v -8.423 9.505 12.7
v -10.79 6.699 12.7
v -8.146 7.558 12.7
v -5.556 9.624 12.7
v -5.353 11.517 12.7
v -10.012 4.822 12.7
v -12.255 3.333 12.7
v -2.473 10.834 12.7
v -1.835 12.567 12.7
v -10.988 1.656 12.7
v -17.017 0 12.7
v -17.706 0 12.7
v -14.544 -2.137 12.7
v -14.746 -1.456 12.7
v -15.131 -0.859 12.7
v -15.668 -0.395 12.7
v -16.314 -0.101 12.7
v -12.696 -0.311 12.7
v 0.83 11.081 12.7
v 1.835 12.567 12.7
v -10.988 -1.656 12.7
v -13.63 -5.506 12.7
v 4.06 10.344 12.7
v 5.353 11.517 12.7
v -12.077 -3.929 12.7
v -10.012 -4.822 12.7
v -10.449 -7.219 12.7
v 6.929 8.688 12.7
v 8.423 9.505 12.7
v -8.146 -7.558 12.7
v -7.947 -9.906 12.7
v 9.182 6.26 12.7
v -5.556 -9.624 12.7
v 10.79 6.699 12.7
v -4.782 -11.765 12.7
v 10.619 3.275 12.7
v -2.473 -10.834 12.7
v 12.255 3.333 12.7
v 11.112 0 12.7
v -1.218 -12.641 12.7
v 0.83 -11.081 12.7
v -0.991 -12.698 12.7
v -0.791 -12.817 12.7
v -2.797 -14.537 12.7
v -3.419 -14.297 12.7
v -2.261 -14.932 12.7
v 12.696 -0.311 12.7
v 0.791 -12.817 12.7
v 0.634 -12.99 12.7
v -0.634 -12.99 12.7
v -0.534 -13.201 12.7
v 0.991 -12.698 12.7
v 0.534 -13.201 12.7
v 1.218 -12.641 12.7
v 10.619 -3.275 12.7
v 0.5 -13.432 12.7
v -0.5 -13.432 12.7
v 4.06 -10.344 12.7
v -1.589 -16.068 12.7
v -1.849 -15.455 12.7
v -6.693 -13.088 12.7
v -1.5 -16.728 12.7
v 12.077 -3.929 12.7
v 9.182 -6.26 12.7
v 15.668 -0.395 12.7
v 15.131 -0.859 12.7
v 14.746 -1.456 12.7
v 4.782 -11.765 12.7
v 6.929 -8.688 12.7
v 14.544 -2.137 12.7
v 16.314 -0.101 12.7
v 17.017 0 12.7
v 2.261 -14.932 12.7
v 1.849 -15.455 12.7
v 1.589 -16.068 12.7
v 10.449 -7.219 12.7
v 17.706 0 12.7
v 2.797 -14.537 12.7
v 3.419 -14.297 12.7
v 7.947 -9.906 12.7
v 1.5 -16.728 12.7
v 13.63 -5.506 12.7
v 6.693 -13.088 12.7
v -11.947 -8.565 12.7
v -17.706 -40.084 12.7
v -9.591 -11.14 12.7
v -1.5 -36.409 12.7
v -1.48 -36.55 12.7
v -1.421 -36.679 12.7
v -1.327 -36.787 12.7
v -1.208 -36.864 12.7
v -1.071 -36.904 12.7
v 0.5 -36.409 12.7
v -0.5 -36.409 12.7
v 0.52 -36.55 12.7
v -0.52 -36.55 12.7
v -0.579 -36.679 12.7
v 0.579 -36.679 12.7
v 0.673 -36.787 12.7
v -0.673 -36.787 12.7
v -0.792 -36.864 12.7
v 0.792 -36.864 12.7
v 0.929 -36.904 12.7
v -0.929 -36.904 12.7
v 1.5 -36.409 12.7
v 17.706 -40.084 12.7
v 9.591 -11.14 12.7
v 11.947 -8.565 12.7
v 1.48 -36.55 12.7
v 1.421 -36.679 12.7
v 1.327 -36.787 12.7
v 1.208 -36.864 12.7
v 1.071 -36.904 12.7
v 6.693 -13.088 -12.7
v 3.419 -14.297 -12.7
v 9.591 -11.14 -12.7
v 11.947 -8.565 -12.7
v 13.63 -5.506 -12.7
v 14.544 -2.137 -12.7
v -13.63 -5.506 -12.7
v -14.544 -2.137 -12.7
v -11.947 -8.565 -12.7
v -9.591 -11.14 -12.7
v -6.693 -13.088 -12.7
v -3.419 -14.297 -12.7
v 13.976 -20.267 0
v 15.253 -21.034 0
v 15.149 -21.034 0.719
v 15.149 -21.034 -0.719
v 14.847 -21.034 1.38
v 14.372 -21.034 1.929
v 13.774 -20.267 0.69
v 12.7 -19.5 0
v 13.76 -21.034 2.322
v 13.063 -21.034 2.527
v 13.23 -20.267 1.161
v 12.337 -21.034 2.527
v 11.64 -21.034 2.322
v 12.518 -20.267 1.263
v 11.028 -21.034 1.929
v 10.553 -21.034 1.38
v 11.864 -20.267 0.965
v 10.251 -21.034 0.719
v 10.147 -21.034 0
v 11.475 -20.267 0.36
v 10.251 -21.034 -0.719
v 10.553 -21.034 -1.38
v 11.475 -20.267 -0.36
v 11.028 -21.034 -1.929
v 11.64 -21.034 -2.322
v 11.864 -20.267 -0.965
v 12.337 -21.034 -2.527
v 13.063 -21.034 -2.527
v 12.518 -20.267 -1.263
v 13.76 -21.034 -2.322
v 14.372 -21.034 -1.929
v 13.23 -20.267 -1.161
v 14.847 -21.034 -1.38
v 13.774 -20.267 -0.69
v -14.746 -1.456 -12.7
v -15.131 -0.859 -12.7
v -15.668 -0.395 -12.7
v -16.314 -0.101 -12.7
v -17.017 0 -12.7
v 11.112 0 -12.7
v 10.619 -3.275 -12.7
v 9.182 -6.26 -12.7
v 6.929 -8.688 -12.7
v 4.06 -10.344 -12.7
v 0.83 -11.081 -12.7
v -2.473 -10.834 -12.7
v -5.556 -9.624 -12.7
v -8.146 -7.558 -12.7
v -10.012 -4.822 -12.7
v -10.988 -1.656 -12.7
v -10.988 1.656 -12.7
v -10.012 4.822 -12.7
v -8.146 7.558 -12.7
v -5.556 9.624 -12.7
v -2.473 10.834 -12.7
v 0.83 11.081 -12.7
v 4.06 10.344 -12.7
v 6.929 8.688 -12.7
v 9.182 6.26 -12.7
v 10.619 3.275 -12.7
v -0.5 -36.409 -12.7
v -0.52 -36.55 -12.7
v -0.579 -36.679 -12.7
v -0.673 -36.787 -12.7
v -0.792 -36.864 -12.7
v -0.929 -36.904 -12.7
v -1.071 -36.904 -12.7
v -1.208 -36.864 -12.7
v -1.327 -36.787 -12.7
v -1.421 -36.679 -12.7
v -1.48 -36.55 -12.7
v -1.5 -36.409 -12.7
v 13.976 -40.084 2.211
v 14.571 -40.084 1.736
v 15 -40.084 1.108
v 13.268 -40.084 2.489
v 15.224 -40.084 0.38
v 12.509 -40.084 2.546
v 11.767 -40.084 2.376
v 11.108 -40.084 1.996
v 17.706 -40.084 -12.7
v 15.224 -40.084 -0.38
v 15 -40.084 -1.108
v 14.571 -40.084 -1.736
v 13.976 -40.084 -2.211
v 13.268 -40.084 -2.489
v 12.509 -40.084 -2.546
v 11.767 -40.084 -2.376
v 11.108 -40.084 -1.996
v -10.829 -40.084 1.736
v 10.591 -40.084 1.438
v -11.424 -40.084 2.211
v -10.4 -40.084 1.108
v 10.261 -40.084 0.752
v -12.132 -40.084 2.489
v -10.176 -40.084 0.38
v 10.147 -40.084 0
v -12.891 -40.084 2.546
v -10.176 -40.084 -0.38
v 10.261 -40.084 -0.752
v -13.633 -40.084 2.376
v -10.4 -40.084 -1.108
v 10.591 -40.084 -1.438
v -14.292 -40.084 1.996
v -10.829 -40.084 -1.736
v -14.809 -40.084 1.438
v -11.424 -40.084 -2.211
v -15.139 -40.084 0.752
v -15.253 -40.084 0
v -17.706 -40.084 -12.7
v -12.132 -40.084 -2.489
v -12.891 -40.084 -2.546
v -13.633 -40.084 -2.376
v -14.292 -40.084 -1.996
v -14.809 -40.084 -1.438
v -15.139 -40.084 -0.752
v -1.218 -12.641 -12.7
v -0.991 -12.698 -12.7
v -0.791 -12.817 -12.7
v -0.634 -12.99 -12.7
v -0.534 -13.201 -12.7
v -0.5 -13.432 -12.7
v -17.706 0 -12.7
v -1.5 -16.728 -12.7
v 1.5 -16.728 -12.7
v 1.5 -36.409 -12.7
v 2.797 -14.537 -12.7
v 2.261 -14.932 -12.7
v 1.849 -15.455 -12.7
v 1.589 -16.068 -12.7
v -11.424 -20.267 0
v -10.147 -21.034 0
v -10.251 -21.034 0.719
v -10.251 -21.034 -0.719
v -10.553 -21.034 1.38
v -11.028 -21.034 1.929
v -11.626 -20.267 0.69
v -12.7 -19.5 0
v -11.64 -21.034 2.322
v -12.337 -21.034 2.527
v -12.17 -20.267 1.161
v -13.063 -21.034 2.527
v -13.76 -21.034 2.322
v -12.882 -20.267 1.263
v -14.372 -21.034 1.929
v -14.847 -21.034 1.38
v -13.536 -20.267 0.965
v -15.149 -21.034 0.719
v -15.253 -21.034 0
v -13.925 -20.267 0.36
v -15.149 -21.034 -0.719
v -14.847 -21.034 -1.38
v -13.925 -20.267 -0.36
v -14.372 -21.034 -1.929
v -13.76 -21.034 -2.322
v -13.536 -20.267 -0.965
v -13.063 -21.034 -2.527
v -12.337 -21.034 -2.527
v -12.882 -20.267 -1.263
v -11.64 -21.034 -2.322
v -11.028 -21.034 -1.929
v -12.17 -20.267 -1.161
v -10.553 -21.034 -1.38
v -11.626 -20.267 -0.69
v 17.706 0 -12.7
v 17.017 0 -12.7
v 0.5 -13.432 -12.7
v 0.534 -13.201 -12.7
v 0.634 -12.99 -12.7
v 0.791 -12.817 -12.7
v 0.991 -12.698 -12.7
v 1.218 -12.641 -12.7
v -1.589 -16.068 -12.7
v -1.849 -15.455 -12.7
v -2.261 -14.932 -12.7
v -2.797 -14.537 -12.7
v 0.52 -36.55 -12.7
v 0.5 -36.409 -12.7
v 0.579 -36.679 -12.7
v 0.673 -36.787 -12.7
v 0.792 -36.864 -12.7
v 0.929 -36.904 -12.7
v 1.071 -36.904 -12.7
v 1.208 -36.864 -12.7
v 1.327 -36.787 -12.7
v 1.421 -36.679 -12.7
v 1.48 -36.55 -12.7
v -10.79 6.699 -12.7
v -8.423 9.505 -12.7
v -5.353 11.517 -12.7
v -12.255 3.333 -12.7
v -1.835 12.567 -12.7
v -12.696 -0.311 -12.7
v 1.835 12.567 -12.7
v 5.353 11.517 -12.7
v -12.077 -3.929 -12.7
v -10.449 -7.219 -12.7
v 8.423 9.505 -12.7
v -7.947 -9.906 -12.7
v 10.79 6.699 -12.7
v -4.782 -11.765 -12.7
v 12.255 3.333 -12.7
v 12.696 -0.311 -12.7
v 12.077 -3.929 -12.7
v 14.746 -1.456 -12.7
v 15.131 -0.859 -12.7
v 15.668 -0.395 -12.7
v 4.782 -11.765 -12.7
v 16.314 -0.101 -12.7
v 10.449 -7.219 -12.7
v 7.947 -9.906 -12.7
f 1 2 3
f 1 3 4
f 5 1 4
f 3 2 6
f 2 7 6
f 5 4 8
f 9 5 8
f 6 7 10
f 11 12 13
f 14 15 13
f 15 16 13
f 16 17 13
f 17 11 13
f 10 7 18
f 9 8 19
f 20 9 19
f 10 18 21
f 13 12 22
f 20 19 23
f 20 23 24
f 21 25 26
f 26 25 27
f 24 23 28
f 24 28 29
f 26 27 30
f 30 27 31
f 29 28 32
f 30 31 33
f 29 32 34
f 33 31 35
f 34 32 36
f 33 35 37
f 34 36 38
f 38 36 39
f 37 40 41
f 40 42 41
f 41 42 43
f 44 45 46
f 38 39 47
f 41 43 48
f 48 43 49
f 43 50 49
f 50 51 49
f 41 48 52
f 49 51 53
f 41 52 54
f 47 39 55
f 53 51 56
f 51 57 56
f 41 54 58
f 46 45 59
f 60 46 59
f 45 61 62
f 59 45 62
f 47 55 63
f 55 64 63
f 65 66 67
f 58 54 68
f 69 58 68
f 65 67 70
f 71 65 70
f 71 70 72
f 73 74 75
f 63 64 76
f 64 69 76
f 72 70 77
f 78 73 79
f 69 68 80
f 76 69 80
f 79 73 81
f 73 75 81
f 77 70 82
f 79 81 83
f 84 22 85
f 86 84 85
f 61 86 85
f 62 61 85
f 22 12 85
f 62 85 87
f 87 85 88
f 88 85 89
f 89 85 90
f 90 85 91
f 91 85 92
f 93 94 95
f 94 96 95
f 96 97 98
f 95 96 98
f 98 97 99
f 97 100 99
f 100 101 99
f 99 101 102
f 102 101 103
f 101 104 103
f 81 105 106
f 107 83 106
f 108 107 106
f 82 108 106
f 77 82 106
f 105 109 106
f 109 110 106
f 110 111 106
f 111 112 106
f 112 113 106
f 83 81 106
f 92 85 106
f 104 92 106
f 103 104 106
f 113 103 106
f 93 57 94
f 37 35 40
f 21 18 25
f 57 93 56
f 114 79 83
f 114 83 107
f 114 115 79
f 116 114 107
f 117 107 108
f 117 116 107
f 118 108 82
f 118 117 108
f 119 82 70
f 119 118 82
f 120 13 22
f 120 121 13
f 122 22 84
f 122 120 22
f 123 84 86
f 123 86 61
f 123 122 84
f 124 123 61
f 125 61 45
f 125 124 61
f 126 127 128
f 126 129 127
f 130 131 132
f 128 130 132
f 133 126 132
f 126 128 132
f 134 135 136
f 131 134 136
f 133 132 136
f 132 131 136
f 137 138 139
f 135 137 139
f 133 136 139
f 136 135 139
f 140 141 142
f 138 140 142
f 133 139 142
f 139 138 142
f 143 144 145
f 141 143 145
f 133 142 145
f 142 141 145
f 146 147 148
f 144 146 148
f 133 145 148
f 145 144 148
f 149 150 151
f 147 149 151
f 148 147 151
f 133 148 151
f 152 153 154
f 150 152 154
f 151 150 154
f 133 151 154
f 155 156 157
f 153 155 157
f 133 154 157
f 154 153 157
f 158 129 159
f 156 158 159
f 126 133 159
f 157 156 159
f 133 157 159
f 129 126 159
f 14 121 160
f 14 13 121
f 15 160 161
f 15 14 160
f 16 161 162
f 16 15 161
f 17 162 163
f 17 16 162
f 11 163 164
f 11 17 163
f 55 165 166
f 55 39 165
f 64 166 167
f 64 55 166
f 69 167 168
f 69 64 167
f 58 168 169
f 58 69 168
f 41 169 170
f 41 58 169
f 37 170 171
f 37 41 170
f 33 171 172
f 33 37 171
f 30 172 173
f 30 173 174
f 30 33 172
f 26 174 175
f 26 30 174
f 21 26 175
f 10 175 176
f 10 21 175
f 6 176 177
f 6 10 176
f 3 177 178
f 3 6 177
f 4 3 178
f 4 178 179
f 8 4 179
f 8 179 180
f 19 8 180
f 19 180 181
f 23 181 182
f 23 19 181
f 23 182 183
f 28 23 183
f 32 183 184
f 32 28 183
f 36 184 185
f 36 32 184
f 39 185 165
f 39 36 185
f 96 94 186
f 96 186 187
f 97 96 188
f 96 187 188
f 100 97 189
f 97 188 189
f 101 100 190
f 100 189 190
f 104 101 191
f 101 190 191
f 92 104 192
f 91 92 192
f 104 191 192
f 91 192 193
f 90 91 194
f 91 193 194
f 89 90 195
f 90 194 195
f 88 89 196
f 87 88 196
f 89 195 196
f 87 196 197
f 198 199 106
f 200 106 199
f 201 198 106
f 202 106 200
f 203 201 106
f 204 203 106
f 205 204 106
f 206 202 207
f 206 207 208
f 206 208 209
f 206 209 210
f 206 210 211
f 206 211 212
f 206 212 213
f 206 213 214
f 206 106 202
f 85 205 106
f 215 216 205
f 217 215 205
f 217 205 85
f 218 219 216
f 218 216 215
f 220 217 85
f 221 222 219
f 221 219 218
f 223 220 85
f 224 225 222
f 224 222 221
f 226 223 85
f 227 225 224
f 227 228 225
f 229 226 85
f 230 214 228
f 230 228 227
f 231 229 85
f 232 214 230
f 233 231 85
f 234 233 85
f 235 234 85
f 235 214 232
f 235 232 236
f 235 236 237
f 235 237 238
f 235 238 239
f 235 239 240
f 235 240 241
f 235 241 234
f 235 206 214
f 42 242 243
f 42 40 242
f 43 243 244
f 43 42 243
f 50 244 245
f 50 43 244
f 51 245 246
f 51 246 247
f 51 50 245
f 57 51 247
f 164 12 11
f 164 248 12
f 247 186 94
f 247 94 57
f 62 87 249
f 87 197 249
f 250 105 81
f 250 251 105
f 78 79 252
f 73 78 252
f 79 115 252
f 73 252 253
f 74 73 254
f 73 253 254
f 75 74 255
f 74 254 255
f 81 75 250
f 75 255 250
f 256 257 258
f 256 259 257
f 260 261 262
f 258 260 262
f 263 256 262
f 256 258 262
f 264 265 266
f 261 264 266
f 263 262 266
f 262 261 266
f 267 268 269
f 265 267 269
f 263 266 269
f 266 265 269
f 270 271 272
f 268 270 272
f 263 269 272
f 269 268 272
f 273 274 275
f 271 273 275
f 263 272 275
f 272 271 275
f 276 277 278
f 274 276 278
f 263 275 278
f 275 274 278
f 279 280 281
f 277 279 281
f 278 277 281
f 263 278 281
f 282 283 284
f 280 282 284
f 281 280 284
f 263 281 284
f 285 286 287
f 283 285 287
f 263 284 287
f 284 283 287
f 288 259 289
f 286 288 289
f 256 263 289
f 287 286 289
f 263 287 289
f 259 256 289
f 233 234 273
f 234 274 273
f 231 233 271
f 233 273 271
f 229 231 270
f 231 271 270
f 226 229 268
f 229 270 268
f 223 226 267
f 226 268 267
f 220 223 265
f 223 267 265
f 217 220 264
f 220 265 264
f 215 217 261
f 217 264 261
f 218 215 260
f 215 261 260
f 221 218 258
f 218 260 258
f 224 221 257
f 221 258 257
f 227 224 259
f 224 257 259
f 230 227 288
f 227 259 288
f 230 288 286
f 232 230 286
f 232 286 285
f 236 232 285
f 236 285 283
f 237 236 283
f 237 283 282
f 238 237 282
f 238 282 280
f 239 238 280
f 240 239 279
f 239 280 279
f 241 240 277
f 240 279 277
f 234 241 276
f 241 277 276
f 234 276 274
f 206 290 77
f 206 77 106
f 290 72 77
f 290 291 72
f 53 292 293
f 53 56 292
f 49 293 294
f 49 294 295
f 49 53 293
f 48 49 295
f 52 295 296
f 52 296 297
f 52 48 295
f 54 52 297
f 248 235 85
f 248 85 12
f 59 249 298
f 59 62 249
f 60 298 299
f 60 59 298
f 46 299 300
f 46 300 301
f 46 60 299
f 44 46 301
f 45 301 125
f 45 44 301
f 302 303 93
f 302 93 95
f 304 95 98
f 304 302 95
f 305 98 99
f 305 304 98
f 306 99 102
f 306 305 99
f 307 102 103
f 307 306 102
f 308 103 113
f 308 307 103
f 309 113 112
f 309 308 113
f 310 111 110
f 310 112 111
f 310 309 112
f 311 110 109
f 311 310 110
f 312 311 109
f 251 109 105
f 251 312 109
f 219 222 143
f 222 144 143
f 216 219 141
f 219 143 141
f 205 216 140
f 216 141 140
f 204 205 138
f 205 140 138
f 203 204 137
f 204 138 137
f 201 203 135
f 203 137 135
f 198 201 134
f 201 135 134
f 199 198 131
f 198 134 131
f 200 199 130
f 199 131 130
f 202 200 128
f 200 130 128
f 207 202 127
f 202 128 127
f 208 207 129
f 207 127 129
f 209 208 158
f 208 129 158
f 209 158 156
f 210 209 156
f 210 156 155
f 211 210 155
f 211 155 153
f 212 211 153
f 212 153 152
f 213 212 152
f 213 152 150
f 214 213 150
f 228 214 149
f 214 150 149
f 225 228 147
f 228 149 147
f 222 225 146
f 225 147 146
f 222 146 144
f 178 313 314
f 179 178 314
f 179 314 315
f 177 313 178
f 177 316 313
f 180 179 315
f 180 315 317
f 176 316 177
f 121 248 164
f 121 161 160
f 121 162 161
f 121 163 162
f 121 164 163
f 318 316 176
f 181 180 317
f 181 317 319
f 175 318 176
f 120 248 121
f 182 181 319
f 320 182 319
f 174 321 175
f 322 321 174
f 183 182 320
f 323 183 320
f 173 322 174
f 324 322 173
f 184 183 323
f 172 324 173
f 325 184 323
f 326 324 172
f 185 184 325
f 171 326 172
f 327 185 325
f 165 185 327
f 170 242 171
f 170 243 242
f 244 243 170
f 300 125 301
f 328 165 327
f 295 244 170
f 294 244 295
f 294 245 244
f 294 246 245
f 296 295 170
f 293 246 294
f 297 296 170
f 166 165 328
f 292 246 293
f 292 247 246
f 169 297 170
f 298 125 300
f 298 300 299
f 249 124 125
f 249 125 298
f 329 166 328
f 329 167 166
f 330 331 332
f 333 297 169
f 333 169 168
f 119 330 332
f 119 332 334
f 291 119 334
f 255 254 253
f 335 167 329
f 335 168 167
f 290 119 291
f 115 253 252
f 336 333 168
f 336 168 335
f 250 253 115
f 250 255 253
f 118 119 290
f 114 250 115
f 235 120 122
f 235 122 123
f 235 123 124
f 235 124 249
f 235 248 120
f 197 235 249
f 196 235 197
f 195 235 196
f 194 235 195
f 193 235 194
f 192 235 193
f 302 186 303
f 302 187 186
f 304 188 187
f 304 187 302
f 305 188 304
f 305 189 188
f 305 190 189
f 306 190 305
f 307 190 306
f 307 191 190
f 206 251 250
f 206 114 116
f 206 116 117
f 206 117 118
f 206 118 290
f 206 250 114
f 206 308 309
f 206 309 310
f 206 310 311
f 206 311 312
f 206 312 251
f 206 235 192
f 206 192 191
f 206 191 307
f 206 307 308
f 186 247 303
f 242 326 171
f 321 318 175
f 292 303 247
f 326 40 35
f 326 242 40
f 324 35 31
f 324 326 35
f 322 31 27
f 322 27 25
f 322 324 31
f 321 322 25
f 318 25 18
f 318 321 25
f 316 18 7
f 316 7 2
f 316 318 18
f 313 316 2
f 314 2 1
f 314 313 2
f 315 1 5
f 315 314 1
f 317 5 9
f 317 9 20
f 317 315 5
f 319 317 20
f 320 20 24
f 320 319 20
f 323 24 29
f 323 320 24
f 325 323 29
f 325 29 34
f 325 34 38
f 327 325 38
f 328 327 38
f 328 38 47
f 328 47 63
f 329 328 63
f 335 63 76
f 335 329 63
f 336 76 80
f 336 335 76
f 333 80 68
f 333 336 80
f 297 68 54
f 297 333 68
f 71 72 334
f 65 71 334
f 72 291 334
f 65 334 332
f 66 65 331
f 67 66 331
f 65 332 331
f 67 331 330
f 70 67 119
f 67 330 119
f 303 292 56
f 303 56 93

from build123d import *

# Parameters (mm, degrees)
SKETCH1_R                  = 11.1125
EXTRUDE1_DEPTH             = 12.7
BUSHING_SIDE_FILLETS_R     = 0.79375
MOUNT_SIDE_FILLETS_R       = 0.79375
F_1_4_MOUNTING_HOLES_D     = 5.1054
F_1_4_MOUNTING_HOLES_DEPTH = 19.05
F_1_4_MOUNTING_HOLES_TIP   = 1.533816902
CUT_EXTRUDE1_DEPTH         = 51.649420448
FILLET1_R                  = 2.5


with BuildPart() as part:
    # Sketch1 → Extrude1 (new, symmetric)
    with BuildSketch(Plane(origin=(0, 0, 0), x_dir=(1, 0, 0), z_dir=(0, 0, -1))):
        with BuildLine():
            Line((0.5, 12.690153663), (0.5, 30.5587))
            Line((0.5, 30.5587), (1.5, 30.5587))
            Line((1.5, 30.5587), (1.5, 14.623269128))
            ThreePointArc((1.5, 14.623269128), (10.911920088, 9.849873096), (14.7, 0))
            Line((14.7, 0), (17.705953405, 0))
            Line((17.705953405, 0), (17.705953405, 40.0837))
            Line((17.705953405, 40.0837), (-17.705953405, 40.0837))
            Line((-17.705953405, 40.0837), (-17.705953405, 0))
            Line((-17.705953405, 0), (-14.7, 0))
            ThreePointArc((-14.7, 0), (-10.911920088, 9.849873096), (-1.5, 14.623269128))
            Line((-1.5, 14.623269128), (-1.5, 30.5587))
            Line((-1.5, 30.5587), (-0.5, 30.5587))
            Line((-0.5, 30.5587), (-0.5, 12.690153663))
            ThreePointArc((-0.5, 12.690153663), (0, -12.7), (0.5, 12.690153663))
        make_face()
        Circle(SKETCH1_R, mode=Mode.SUBTRACT)
    extrude(amount=EXTRUDE1_DEPTH, both=True)

    # Bushing-side fillets
    bushing_side_fillets_edges = [part.edges().sort_by_distance(p)[0] for p in [
        (-0.5, -12.690153663, 0),
        (0.5, -12.690153663, 0),
    ]]
    fillet(bushing_side_fillets_edges, radius=BUSHING_SIDE_FILLETS_R)

    # Mount-side fillets
    mount_side_fillets_edges = [part.edges().sort_by_distance(p)[0] for p in [
        (-0.5, -30.5587, 0),
        (0.5, -30.5587, 0),
    ]]
    fillet(mount_side_fillets_edges, radius=MOUNT_SIDE_FILLETS_R)

    # 1/4 Mounting holes
    with Locations(Plane.XZ.offset(40.0837)):
        with Locations((-12.7, 0), (12.7, 0)):
            Hole(F_1_4_MOUNTING_HOLES_D / 2, depth=F_1_4_MOUNTING_HOLES_DEPTH)
            with Locations((0, 0, -(F_1_4_MOUNTING_HOLES_DEPTH + F_1_4_MOUNTING_HOLES_TIP / 2))):  # 118° drill point
                Cone(0, F_1_4_MOUNTING_HOLES_D / 2, F_1_4_MOUNTING_HOLES_TIP, mode=Mode.SUBTRACT)

    # Sketch6 → Cut-Extrude1 (cut, through all)
    with BuildSketch(Plane(origin=(0, 0, -12.7), x_dir=(-1, 0, 0), z_dir=(0, 0, -1))):
        with BuildLine():
            Line((0.5, -29.6587), (0.5, -36.4087))
            ThreePointArc((0.5, -36.4087), (1, -36.9087), (1.5, -36.4087))
            Line((1.5, -36.4087), (1.5, -30.5587))
            Line((1.5, -30.5587), (1.4, -30.5587))
            ThreePointArc((1.4, -30.5587), (0.763603897, -30.295096103), (0.5, -29.6587))
        make_face()
        with BuildLine():
            Line((-1.5, -30.5587), (-1.4, -30.5587))
            ThreePointArc((-1.4, -30.5587), (-0.763603897, -30.295096103), (-0.5, -29.6587))
            Line((-0.5, -29.6587), (-0.5, -36.4087))
            ThreePointArc((-0.5, -36.4087), (-1, -36.9087), (-1.5, -36.4087))
            Line((-1.5, -36.4087), (-1.5, -30.5587))
        make_face()
    extrude(amount=-CUT_EXTRUDE1_DEPTH, mode=Mode.SUBTRACT)

    # Fillet1
    fillet1_edges = [part.edges().sort_by_distance(p)[0] for p in [
        (-14.7, 0, 0),
        (-1.5, -14.623269128, 0),
        (1.5, -14.623269128, 0),
        (14.7, 0, 0),
    ]]
    fillet(fillet1_edges, radius=FILLET1_R)


solid = part.part
